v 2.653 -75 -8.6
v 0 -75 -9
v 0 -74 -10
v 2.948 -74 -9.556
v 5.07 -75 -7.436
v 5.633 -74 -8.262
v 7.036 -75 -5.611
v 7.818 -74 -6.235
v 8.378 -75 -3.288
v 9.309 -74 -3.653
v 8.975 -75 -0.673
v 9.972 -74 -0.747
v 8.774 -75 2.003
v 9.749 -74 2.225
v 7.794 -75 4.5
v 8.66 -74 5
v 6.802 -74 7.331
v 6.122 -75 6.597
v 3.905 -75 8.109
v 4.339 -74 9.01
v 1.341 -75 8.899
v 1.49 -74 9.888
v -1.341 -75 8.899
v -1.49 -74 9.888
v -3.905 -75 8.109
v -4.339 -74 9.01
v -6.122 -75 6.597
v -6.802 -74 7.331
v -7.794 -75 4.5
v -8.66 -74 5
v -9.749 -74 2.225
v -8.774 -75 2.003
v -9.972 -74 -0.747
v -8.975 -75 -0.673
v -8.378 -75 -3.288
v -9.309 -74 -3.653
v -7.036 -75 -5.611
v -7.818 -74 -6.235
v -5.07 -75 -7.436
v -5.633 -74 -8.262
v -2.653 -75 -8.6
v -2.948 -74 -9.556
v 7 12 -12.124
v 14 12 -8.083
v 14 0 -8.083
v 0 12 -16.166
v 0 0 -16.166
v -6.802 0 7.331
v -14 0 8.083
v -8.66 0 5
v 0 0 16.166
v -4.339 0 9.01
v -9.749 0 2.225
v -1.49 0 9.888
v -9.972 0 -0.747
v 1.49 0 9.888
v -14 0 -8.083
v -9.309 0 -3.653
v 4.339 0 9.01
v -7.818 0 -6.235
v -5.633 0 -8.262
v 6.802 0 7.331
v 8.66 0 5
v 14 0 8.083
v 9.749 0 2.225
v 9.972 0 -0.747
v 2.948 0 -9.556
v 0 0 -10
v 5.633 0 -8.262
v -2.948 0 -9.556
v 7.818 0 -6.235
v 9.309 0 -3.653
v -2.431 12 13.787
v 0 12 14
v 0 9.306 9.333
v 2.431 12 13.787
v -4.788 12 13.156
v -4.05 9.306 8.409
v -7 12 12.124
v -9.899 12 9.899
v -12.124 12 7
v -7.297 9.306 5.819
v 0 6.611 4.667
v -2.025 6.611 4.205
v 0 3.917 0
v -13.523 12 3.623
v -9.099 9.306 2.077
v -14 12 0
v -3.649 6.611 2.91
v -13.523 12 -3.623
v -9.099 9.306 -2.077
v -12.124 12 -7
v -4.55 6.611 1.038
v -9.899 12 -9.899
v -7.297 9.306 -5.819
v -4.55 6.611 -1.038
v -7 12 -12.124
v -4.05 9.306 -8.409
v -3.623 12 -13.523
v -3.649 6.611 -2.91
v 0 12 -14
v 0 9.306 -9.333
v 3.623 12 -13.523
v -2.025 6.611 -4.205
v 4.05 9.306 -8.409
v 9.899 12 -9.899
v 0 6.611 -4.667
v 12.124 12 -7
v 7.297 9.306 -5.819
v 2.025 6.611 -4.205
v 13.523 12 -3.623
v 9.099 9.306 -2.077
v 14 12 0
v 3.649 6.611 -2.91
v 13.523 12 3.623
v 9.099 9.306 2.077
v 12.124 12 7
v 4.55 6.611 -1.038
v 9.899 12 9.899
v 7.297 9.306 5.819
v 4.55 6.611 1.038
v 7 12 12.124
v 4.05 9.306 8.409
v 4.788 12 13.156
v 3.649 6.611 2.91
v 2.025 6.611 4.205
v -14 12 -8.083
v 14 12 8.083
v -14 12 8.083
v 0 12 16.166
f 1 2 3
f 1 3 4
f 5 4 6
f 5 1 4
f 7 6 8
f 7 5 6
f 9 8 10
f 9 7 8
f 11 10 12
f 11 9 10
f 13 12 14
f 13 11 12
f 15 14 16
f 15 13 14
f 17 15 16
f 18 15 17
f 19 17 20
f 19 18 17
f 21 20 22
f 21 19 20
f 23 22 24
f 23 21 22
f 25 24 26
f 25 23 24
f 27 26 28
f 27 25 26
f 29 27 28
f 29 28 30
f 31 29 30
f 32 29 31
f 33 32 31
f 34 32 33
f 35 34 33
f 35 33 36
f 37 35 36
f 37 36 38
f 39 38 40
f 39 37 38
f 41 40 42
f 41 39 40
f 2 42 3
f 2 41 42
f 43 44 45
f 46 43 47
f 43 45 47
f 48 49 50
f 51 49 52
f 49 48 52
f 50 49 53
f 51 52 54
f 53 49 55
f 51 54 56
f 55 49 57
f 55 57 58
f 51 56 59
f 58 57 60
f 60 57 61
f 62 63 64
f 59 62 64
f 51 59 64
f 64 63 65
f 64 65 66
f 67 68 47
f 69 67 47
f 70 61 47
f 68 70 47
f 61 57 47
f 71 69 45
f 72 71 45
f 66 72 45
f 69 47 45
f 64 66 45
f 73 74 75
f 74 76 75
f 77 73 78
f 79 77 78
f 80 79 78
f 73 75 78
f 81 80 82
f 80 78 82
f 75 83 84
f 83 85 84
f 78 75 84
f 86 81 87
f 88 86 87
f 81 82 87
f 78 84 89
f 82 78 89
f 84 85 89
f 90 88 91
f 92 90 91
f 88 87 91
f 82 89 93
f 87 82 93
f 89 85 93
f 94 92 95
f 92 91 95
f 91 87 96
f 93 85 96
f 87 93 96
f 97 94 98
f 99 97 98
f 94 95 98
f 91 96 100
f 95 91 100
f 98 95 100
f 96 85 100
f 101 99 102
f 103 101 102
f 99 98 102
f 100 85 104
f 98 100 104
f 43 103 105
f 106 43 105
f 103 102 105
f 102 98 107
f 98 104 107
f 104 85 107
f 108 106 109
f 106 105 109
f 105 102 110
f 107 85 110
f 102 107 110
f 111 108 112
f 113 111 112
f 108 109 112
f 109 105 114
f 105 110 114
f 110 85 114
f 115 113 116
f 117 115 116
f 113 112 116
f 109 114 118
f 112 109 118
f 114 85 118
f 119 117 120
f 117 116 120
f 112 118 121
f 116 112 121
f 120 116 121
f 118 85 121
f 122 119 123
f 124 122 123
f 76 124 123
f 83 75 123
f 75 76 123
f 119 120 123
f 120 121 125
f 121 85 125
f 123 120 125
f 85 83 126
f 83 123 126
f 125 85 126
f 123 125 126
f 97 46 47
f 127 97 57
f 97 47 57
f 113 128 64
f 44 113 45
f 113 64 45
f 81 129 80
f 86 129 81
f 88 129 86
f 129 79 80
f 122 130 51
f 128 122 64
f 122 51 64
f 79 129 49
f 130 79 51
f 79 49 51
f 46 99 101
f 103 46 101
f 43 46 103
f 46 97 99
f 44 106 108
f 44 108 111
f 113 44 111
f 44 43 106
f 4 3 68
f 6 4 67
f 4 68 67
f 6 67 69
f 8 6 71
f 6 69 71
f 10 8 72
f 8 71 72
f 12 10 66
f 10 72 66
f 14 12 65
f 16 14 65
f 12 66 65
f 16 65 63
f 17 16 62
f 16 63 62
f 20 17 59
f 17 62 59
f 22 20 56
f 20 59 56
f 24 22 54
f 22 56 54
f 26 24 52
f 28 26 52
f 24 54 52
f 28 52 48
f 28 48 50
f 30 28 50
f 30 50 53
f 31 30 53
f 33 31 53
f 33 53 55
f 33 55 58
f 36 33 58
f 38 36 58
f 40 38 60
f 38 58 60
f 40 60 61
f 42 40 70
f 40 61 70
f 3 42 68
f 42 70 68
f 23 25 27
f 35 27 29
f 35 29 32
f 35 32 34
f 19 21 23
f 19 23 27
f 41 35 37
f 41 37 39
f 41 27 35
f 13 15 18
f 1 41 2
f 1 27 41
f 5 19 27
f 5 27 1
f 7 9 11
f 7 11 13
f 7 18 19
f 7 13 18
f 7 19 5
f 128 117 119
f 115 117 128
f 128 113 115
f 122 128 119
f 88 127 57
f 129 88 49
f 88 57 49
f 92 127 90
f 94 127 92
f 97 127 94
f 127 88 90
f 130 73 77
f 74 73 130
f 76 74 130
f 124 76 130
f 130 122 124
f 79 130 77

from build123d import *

# Parameters (mm, degrees)
BOSS_EXTRUDE1_DEPTH = 12
SKETCH3_R           = 10
BOSS_EXTRUDE2_DEPTH = 75
CHAMFER1_SIZE       = 1


with BuildPart() as part:
    # Sketch1 → Boss-Extrude1 (new body)
    with BuildSketch(Plane(origin=(0, 0, 0), x_dir=(1, 0, 0), z_dir=(0, 1, 0))):
        Polygon((14, 8.082903769), (0, 16.165807537), (-14, 8.082903769), (-14, -8.082903769), (0, -16.165807537), (14, -8.082903769), align=None)
    extrude(amount=BOSS_EXTRUDE1_DEPTH)

    # Cut-Extrude1 cone 1 section (through the dimple's axis) → Cut-Extrude1 (revolve, cut)
    with BuildSketch(Plane(origin=(0, 12, 0), x_dir=(0, 0, 1), z_dir=(1, 0, 0))):
        Polygon((0, 0), (14, 0), (0, 8.082903769), align=None)
    revolve(axis=Axis((0, 12, 0), (0, -1, 0)), mode=Mode.SUBTRACT)

    # Sketch3 → Boss-Extrude2 (add)
    with BuildSketch(Plane.XZ):
        with Locations(Location((0, 0, 0), (0, 0, 270))):
            Circle(SKETCH3_R)
    extrude(amount=BOSS_EXTRUDE2_DEPTH)

    # Chamfer1
    chamfer1_edges = [part.edges().sort_by_distance(p)[0] for p in [
        (0, -75, 10),
    ]]
    chamfer(chamfer1_edges, length=CHAMFER1_SIZE)


solid = part.part
